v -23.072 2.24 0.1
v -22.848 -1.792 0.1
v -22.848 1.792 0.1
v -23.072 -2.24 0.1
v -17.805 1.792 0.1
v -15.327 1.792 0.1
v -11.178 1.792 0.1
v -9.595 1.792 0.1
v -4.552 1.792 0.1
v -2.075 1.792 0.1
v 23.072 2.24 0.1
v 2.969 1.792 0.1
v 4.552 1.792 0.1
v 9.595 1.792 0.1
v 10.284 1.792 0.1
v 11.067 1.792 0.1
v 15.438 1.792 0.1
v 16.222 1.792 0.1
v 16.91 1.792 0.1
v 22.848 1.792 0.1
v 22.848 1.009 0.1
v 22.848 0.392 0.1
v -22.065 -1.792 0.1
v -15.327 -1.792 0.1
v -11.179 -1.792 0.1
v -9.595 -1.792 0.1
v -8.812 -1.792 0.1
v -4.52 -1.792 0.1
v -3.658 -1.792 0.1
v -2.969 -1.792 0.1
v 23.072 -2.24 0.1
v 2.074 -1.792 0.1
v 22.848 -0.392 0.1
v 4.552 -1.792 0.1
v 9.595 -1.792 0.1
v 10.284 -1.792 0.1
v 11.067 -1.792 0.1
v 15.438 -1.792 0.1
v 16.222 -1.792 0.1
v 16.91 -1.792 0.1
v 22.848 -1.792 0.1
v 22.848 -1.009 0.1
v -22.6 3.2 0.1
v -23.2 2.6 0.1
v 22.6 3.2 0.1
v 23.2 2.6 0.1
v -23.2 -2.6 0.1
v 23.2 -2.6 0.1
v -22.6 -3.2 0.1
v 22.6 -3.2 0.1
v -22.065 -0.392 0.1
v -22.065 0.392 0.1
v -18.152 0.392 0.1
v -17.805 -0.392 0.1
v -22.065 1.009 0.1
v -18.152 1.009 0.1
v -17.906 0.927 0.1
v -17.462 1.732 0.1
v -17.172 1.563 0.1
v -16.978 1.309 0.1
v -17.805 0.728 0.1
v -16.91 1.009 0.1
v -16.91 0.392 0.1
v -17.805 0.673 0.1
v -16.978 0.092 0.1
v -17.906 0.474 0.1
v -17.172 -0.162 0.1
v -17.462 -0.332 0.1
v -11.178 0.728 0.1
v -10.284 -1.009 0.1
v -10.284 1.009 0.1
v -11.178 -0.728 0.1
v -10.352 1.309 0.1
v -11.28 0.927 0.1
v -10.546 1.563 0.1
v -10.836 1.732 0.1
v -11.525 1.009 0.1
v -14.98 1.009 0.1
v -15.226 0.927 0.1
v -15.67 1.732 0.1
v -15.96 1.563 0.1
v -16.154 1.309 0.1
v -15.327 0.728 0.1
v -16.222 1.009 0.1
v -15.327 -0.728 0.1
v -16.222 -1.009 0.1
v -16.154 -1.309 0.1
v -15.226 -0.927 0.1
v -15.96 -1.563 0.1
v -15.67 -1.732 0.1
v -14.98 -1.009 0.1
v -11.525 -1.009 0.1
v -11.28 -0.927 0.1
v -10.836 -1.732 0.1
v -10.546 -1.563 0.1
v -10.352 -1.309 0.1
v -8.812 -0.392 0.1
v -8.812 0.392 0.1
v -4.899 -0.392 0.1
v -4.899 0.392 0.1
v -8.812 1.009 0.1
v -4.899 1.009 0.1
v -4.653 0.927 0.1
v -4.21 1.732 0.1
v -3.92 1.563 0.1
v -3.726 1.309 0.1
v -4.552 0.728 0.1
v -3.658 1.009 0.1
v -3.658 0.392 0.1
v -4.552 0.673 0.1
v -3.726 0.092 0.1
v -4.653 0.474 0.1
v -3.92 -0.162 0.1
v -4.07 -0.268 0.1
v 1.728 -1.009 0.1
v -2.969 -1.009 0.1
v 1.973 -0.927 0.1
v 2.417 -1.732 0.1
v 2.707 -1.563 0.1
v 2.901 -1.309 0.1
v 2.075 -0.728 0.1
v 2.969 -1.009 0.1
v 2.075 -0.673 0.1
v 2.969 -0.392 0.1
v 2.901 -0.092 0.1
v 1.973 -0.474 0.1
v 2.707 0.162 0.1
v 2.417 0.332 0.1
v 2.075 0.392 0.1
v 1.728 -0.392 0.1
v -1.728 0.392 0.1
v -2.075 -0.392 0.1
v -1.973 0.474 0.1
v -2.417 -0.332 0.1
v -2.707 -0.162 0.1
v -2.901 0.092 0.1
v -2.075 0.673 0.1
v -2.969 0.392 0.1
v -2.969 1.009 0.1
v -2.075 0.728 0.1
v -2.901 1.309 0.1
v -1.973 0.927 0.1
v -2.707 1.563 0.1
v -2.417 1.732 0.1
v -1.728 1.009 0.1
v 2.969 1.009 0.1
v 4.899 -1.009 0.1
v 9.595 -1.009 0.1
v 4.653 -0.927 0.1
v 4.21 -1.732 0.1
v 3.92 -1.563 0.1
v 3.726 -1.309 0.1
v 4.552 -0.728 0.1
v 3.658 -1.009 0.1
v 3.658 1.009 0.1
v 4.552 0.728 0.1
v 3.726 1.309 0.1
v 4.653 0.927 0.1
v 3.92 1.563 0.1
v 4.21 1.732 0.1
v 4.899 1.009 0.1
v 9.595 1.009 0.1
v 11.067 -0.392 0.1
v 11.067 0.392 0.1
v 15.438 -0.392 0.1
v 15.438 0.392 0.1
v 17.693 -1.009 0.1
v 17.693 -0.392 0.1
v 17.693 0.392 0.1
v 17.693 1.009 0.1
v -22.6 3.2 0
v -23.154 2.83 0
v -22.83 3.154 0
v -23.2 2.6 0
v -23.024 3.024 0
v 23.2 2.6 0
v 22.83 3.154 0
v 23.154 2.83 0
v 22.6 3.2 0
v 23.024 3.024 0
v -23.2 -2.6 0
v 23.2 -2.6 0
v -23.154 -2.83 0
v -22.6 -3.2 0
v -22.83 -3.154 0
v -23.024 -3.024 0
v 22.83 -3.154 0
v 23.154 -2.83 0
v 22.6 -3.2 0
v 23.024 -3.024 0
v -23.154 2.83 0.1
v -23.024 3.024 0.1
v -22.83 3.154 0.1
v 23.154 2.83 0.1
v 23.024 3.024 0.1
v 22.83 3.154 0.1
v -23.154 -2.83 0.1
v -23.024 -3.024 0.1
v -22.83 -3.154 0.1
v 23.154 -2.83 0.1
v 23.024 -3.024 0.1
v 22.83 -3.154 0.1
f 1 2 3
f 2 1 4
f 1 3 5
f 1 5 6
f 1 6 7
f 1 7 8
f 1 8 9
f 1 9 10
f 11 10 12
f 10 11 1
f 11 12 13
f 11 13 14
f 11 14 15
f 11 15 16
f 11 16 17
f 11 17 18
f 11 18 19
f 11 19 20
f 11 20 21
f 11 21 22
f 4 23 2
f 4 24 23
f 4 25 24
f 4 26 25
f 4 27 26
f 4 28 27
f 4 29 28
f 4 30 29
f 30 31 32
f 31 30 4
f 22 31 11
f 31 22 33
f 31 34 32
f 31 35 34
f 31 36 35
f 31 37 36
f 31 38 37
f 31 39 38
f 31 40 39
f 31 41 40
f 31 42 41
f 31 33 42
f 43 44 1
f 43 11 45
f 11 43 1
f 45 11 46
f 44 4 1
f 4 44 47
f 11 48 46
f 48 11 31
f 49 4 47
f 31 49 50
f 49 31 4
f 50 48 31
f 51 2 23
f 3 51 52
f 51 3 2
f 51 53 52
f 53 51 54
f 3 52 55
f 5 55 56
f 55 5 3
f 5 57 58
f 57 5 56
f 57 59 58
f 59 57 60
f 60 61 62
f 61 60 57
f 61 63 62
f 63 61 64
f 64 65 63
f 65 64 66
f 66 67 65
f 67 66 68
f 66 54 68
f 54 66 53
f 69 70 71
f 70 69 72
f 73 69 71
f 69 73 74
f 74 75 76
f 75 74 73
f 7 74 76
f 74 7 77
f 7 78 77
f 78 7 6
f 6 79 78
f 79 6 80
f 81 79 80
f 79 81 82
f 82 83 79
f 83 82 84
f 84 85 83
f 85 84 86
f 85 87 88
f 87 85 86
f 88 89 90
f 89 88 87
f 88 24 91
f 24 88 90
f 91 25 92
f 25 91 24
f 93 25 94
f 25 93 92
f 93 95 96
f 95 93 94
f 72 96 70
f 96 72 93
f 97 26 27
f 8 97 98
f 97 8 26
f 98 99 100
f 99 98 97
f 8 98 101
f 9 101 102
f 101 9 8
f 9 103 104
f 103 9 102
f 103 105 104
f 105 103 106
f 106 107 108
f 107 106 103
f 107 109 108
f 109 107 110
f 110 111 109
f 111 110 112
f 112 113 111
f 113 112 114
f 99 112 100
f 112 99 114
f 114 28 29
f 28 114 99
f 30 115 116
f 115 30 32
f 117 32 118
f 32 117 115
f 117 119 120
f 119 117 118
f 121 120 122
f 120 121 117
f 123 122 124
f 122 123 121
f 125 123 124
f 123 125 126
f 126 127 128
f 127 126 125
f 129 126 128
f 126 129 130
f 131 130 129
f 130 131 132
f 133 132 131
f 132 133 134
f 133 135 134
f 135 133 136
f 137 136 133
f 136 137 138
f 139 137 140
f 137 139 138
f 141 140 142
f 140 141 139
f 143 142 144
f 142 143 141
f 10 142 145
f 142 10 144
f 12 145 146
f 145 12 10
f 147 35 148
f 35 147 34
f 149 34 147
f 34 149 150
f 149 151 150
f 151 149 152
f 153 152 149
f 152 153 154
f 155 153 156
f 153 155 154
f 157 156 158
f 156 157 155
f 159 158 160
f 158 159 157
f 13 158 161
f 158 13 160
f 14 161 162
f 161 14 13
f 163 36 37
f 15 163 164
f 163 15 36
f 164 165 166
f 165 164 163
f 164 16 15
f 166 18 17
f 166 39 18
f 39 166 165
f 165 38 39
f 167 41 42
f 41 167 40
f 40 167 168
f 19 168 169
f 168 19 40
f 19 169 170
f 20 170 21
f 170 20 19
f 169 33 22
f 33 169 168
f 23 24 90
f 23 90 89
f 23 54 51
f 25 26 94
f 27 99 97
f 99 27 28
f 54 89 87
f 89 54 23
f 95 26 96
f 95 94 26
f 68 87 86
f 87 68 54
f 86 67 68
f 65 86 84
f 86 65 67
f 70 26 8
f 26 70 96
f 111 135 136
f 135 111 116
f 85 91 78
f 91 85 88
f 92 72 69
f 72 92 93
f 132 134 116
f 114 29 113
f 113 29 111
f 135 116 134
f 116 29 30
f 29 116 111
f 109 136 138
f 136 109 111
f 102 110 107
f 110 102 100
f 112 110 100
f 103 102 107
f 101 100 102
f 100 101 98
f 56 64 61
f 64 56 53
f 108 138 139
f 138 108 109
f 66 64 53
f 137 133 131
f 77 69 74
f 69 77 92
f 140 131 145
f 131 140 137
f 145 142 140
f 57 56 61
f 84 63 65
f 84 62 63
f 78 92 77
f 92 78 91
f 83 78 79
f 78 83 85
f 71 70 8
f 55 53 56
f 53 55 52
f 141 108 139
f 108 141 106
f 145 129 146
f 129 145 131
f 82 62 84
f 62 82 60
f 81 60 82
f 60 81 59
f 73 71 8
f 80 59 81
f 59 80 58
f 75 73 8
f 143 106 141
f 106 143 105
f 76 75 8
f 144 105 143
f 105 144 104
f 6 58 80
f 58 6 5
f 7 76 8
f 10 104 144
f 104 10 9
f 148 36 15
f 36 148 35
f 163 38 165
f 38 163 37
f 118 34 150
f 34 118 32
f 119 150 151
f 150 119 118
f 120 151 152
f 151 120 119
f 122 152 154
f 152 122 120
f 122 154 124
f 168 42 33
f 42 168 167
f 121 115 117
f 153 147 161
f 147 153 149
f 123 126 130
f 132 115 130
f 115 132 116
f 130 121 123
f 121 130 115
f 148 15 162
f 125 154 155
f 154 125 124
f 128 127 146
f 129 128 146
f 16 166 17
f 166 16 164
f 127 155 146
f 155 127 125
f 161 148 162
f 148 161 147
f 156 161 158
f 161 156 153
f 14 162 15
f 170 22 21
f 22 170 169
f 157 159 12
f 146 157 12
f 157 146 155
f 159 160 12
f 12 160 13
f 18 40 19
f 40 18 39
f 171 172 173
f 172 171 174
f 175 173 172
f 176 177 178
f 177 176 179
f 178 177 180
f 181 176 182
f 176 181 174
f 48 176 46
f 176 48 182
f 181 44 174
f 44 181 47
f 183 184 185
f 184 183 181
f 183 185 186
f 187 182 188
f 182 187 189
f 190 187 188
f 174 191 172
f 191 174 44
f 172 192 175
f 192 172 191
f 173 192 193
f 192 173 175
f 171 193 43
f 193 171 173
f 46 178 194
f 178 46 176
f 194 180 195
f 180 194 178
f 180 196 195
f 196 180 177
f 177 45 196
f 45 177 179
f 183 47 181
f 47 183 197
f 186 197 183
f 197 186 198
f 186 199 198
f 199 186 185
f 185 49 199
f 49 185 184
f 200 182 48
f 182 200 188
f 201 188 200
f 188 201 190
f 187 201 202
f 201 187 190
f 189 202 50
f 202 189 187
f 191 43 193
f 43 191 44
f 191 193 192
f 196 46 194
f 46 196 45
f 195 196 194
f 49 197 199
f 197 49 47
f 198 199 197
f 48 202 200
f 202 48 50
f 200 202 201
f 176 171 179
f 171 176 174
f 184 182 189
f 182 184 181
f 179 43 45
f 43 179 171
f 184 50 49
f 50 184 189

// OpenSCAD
// file: s/6148328ps02.scad
use <../../lib.scad>
function ldraw_lib__s__6148328ps02() = [
// 0 ~Sticker  0.8 x  5.8 with Red "PORSCHE" on Black Background - Complementary faces
// 0 Name: s\6148328ps02.dat
// 0 Author: Massimo Maso [Sirio]
// 0 !LDRAW_ORG Subpart UPDATE 2024-05
// 0 !LICENSE Licensed under CC BY 4.0 : see CAreadme.txt
// 
// 0 BFC CERTIFY CCW
  [0,"BFC","CERTIFY"],
  [0,"BFC","CCW"],
// 
// 0 !HISTORY 2024-06-30 [OrionP] Official Update 2024-05
// 
// 
// 0 // Faces
// 3 16 -56.5 0 8 -58 0 6.5 -57.68 0 5.6
  [3,16,-56.5,0,8,-58,0,6.5,-57.68,0,5.6],
// 4 16 -56.5 0 8 -57.68 0 5.6 57.68 0 5.6 56.5 0 8
  [4,16,-56.5,0,8,-57.68,0,5.6,57.68,0,5.6,56.5,0,8],
// 3 16 56.5 0 8 57.68 0 5.6 58 0 6.5
  [3,16,56.5,0,8,57.68,0,5.6,58,0,6.5],
// 4 16 -58 0 6.5 -58 0 -6.5 -57.68 0 -5.6 -57.68 0 5.6
  [4,16,-58,0,6.5,-58,0,-6.5,-57.68,0,-5.6,-57.68,0,5.6],
// 4 16 58 0 6.5 57.68 0 5.6 57.68 0 -5.6 58 0 -6.5
  [4,16,58,0,6.5,57.68,0,5.6,57.68,0,-5.6,58,0,-6.5],
// 3 16 -56.5 0 -8 -57.68 0 -5.6 -58 0 -6.5
  [3,16,-56.5,0,-8,-57.68,0,-5.6,-58,0,-6.5],
// 4 16 -56.5 0 -8 56.5 0 -8 57.68 0 -5.6 -57.68 0 -5.6
  [4,16,-56.5,0,-8,56.5,0,-8,57.68,0,-5.6,-57.68,0,-5.6],
// 3 16 56.5 0 -8 58 0 -6.5 57.68 0 -5.6
  [3,16,56.5,0,-8,58,0,-6.5,57.68,0,-5.6],
];
module ldraw_lib__s__6148328ps02(step=0, col=false, unit=2/5, alt=false, line=0.2, solid=!$preview)
    makepoly(ldraw_lib__s__6148328ps02(), step=step, col=col, unit=unit, alt=alt, line=line, solid=solid);
ldraw_lib__s__6148328ps02(line=0.2);
// file: s/6148328ps01.scad
use <../../lib.scad>
function ldraw_lib__s__6148328ps01() = [
// 0 ~Sticker  0.8 x  5.8 with Red "PORSCHE" on Black Background - Outerbox for Logo Unscaled
// 0 Name: s\6148328ps01.dat
// 0 Author: Massimo Maso [Sirio]
// 0 !LDRAW_ORG Subpart UPDATE 2024-08
// 0 !LICENSE Licensed under CC BY 4.0 : see CAreadme.txt
// 
// 0 BFC CERTIFY CCW
  [0,"BFC","CERTIFY"],
  [0,"BFC","CCW"],
// 
// 0 !HISTORY 2023-10-31 [OrionP] Official Update 2023-05
// 0 !HISTORY 2024-07-21 [Sirio] Modified for change of logo primitive
// 0 !HISTORY 2024-09-30 [OrionP] Official Update 2024-08
// 
// 0 // Outerbox
// 4 16 -51.5 0 5 -51.5 0 -5 -51 0 -4 -51 0 4
  [4,16,-51.5,0,5,-51.5,0,-5,-51,0,-4,-51,0,4],
// 3 16 -51.5 0 5 -51 0 4 -39.7424 0 4
  [3,16,-51.5,0,5,-51,0,4,-39.7424,0,4],
// 3 16 -51.5 0 5 -39.7424 0 4 -34.2129 0 4
  [3,16,-51.5,0,5,-39.7424,0,4,-34.2129,0,4],
// 3 16 -51.5 0 5 -34.2129 0 4 -24.9513 0 4
  [3,16,-51.5,0,5,-34.2129,0,4,-24.9513,0,4],
// 3 16 -51.5 0 5 -24.9513 0 4 -21.4179 0 4
  [3,16,-51.5,0,5,-24.9513,0,4,-21.4179,0,4],
// 3 16 -51.5 0 5 -21.4179 0 4 -10.1603 0 4
  [3,16,-51.5,0,5,-21.4179,0,4,-10.1603,0,4],
// 3 16 -51.5 0 5 -10.1603 0 4 -4.6308 0 4
  [3,16,-51.5,0,5,-10.1603,0,4,-4.6308,0,4],
// 4 16 -51.5 0 5 -4.6308 0 4 6.6268 0 4 51.5 0 5
  [4,16,-51.5,0,5,-4.6308,0,4,6.6268,0,4,51.5,0,5],
// 3 16 51.5 0 5 6.6268 0 4 10.1603 0 4
  [3,16,51.5,0,5,6.6268,0,4,10.1603,0,4],
// 3 16 51.5 0 5 10.1603 0 4 21.4179 0 4
  [3,16,51.5,0,5,10.1603,0,4,21.4179,0,4],
// 3 16 51.5 0 5 21.4179 0 4 22.9553 0 4
  [3,16,51.5,0,5,21.4179,0,4,22.9553,0,4],
// 3 16 51.5 0 5 22.9553 0 4 24.7033 0 4
  [3,16,51.5,0,5,22.9553,0,4,24.7033,0,4],
// 3 16 51.5 0 5 24.7033 0 4 34.4609 0 4
  [3,16,51.5,0,5,24.7033,0,4,34.4609,0,4],
// 3 16 51.5 0 5 34.4609 0 4 36.2089 0 4
  [3,16,51.5,0,5,34.4609,0,4,36.2089,0,4],
// 3 16 51.5 0 5 36.2089 0 4 37.7464 0 4
  [3,16,51.5,0,5,36.2089,0,4,37.7464,0,4],
// 3 16 51.5 0 5 37.7464 0 4 51 0 4
  [3,16,51.5,0,5,37.7464,0,4,51,0,4],
// 3 16 51.5 0 5 51 0 4 51 0 2.252
  [3,16,51.5,0,5,51,0,4,51,0,2.252],
// 3 16 51.5 0 5 51 0 2.252 51 0 .874
  [3,16,51.5,0,5,51,0,2.252,51,0,.874],
// 3 16 -51.5 0 -5 -49.252 0 -4 -51 0 -4
  [3,16,-51.5,0,-5,-49.252,0,-4,-51,0,-4],
// 3 16 -51.5 0 -5 -34.212 0 -4 -49.252 0 -4
  [3,16,-51.5,0,-5,-34.212,0,-4,-49.252,0,-4],
// 3 16 -51.5 0 -5 -24.9522 0 -4 -34.212 0 -4
  [3,16,-51.5,0,-5,-24.9522,0,-4,-34.212,0,-4],
// 3 16 -51.5 0 -5 -21.4179 0 -4 -24.9522 0 -4
  [3,16,-51.5,0,-5,-21.4179,0,-4,-24.9522,0,-4],
// 3 16 -51.5 0 -5 -19.6699 0 -4 -21.4179 0 -4
  [3,16,-51.5,0,-5,-19.6699,0,-4,-21.4179,0,-4],
// 3 16 -51.5 0 -5 -10.0889 0 -4 -19.6699 0 -4
  [3,16,-51.5,0,-5,-10.0889,0,-4,-19.6699,0,-4],
// 3 16 -51.5 0 -5 -8.1643 0 -4 -10.0889 0 -4
  [3,16,-51.5,0,-5,-8.1643,0,-4,-10.0889,0,-4],
// 3 16 -51.5 0 -5 -6.6268 0 -4 -8.1643 0 -4
  [3,16,-51.5,0,-5,-6.6268,0,-4,-8.1643,0,-4],
// 4 16 -51.5 0 -5 51.5 0 -5 4.6299 0 -4 -6.6268 0 -4
  [4,16,-51.5,0,-5,51.5,0,-5,4.6299,0,-4,-6.6268,0,-4],
// 4 16 51.5 0 5 51 0 .874 51 0 -.874 51.5 0 -5
  [4,16,51.5,0,5,51,0,.874,51,0,-.874,51.5,0,-5],
// 3 16 51.5 0 -5 10.1612 0 -4 4.6299 0 -4
  [3,16,51.5,0,-5,10.1612,0,-4,4.6299,0,-4],
// 3 16 51.5 0 -5 21.4179 0 -4 10.1612 0 -4
  [3,16,51.5,0,-5,21.4179,0,-4,10.1612,0,-4],
// 3 16 51.5 0 -5 22.9553 0 -4 21.4179 0 -4
  [3,16,51.5,0,-5,22.9553,0,-4,21.4179,0,-4],
// 3 16 51.5 0 -5 24.7033 0 -4 22.9553 0 -4
  [3,16,51.5,0,-5,24.7033,0,-4,22.9553,0,-4],
// 3 16 51.5 0 -5 34.4609 0 -4 24.7033 0 -4
  [3,16,51.5,0,-5,34.4609,0,-4,24.7033,0,-4],
// 3 16 51.5 0 -5 36.2089 0 -4 34.4609 0 -4
  [3,16,51.5,0,-5,36.2089,0,-4,34.4609,0,-4],
// 3 16 51.5 0 -5 37.7464 0 -4 36.2089 0 -4
  [3,16,51.5,0,-5,37.7464,0,-4,36.2089,0,-4],
// 3 16 51.5 0 -5 51 0 -4 37.7464 0 -4
  [3,16,51.5,0,-5,51,0,-4,37.7464,0,-4],
// 3 16 51.5 0 -5 51 0 -2.252 51 0 -4
  [3,16,51.5,0,-5,51,0,-2.252,51,0,-4],
// 3 16 51.5 0 -5 51 0 -.874 51 0 -2.252
  [3,16,51.5,0,-5,51,0,-.874,51,0,-2.252],
];
module ldraw_lib__s__6148328ps01(step=0, col=false, unit=2/5, alt=false, line=0.2, solid=!$preview)
    makepoly(ldraw_lib__s__6148328ps01(), step=step, col=col, unit=unit, alt=alt, line=line, solid=solid);
ldraw_lib__s__6148328ps01(line=0.2);
// file: ../p/box3u12.scad
use <../lib.scad>
function ldraw_lib__box3u12() = [
// 0 Box with 3 Parallel Faces without Any Edges
// 0 Name: box3u12.dat
// 0 Author: J.C. Tchang [tchang]
// 0 !LDRAW_ORG Primitive UPDATE 2014-02
// 0 !LICENSE Licensed under CC BY 4.0 : see CAreadme.txt
// 
// 0 BFC CERTIFY CCW
  [0,"BFC","CERTIFY"],
  [0,"BFC","CCW"],
// 
// 0 !HISTORY 2014-12-23 [PTadmin] Official Update 2014-02
// 
// 
// 4 16 -1 1 1 1 1 1 1 1 -1 -1 1 -1
  [4,16,-1,1,1,1,1,1,1,1,-1,-1,1,-1],
// 4 16 -1 1 1 -1 0 1 1 0 1 1 1 1
  [4,16,-1,1,1,-1,0,1,1,0,1,1,1,1],
// 4 16 1 1 -1 1 0 -1 -1 0 -1 -1 1 -1
  [4,16,1,1,-1,1,0,-1,-1,0,-1,-1,1,-1],
];
module ldraw_lib__box3u12(step=0, col=false, unit=2/5, alt=false, line=0.2, solid=!$preview)
    makepoly(ldraw_lib__box3u12(), step=step, col=col, unit=unit, alt=alt, line=line, solid=solid);
ldraw_lib__box3u12(line=0.2);
// file: ../p/1-4cyli.scad
use <../lib.scad>
function ldraw_lib__1_4cyli() = [
// 0 Cylinder 0.25
// 0 Name: 1-4cyli.dat
// 0 Author: James Jessiman
// 0 !LDRAW_ORG Primitive UPDATE 2012-01
// 0 !LICENSE Licensed under CC BY 4.0 : see CAreadme.txt
// 
// 0 BFC CERTIFY CCW
  [0,"BFC","CERTIFY"],
  [0,"BFC","CCW"],
// 
// 0 !HISTORY 2002-03-23 [sbliss] Added BFC statement.
// 0 !HISTORY 2002-04-25 [PTadmin] Official Update 2002-02
// 0 !HISTORY 2007-06-22 [PTadmin] Header formatted for Contributor Agreement
// 0 !HISTORY 2008-07-01 [PTadmin] Official Update 2008-01
// 0 !HISTORY 2012-02-16 [Philo] Changed to CCW
// 0 !HISTORY 2012-03-30 [PTadmin] Official Update 2012-01
// 
// 
// 4 16 1 1 0 0.9239 1 0.3827 0.9239 0 0.3827 1 0 0
  [4,16,1,1,0,0.9239,1,0.3827,0.9239,0,0.3827,1,0,0],
// 5 24 1 0 0 1 1 0 0.9239 0 0.3827 1 0 -1
  [5,24,1,0,0,1,1,0,0.9239,0,0.3827,1,0,-1],
// 4 16 0.9239 1 0.3827 0.7071 1 0.7071 0.7071 0 0.7071 0.9239 0 0.3827
  [4,16,0.9239,1,0.3827,0.7071,1,0.7071,0.7071,0,0.7071,0.9239,0,0.3827],
// 5 24 0.9239 0 0.3827 0.9239 1 0.3827 0.7071 0 0.7071 1 0 0
  [5,24,0.9239,0,0.3827,0.9239,1,0.3827,0.7071,0,0.7071,1,0,0],
// 4 16 0.7071 1 0.7071 0.3827 1 0.9239 0.3827 0 0.9239 0.7071 0 0.7071
  [4,16,0.7071,1,0.7071,0.3827,1,0.9239,0.3827,0,0.9239,0.7071,0,0.7071],
// 5 24 0.7071 0 0.7071 0.7071 1 0.7071 0.3827 0 0.9239 0.9239 0 0.3827
  [5,24,0.7071,0,0.7071,0.7071,1,0.7071,0.3827,0,0.9239,0.9239,0,0.3827],
// 4 16 0.3827 1 0.9239 0 1 1 0 0 1 0.3827 0 0.9239
  [4,16,0.3827,1,0.9239,0,1,1,0,0,1,0.3827,0,0.9239],
// 5 24 0.3827 0 0.9239 0.3827 1 0.9239 0 0 1 0.7071 0 0.7071
  [5,24,0.3827,0,0.9239,0.3827,1,0.9239,0,0,1,0.7071,0,0.7071],
// 5 24 0 0 1 0 1 1 0.3827 0 0.9239 -1 0 1
  [5,24,0,0,1,0,1,1,0.3827,0,0.9239,-1,0,1],
];
module ldraw_lib__1_4cyli(step=0, col=false, unit=2/5, alt=false, line=0.2, solid=!$preview)
    makepoly(ldraw_lib__1_4cyli(), step=step, col=col, unit=unit, alt=alt, line=line, solid=solid);
ldraw_lib__1_4cyli(line=0.2);
// file: ../p/1-4chrd.scad
use <../lib.scad>
function ldraw_lib__1_4chrd() = [
// 0 Chord 0.25
// 0 Name: 1-4chrd.dat
// 0 Author: Max Martin Richter [MMR1988]
// 0 !LDRAW_ORG Primitive UPDATE 2023-05
// 0 !LICENSE Licensed under CC BY 4.0 : see CAreadme.txt
// 
// 0 BFC CERTIFY CCW
  [0,"BFC","CERTIFY"],
  [0,"BFC","CCW"],
// 
// 0 !HISTORY 2004-04-22 [PTadmin] Official Update 2004-02
// 0 !HISTORY 2007-10-09 [PTadmin] Header formatted for Contributor Agreement
// 0 !HISTORY 2008-07-01 [PTadmin] Official Update 2008-01
// 0 !HISTORY 2012-08-02 [MMR1988] Re-creation with PrimGen2 and Rectifier
// 0 !HISTORY 2012-08-09 [PTadmin] Official Update 2012-02
// 0 !HISTORY 2023-10-27 [OrionP] Change author to MMR1988 from hafhead
// 0 !HISTORY 2023-10-31 [OrionP] Official Update 2023-05
// 
// 4 16 0.9239 0 0.3827 0.3827 0 0.9239 0 0 1 1 0 0
  [4,16,0.9239,0,0.3827,0.3827,0,0.9239,0,0,1,1,0,0],
// 3 16 0.7071 0 0.7071 0.3827 0 0.9239 0.9239 0 0.3827
  [3,16,0.7071,0,0.7071,0.3827,0,0.9239,0.9239,0,0.3827],
];
module ldraw_lib__1_4chrd(step=0, col=false, unit=2/5, alt=false, line=0.2, solid=!$preview)
    makepoly(ldraw_lib__1_4chrd(), step=step, col=col, unit=unit, alt=alt, line=line, solid=solid);
ldraw_lib__1_4chrd(line=0.2);
// main file
use <../lib.scad>
use <../p/1-4chrd.scad>
use <../p/1-4cyli.scad>
use <../p/box3u12.scad>
use <../p/logo-porsche-box.scad>
use <../p/logo-porsche-text.scad>
use <s/6148328ps01.scad>
use <s/6148328ps02.scad>
function ldraw_lib__6148328p() = [
// 0 Sticker  0.8 x  5.8 with Red "PORSCHE" on White Background
// 0 Name: 6148328p.dat
// 0 Author: Massimo Maso [Sirio]
// 0 !LDRAW_ORG Part UPDATE 2024-08
// 0 !LICENSE Licensed under CC BY 4.0 : see CAreadme.txt
// 
// 0 BFC CERTIFY CCW
  [0,"BFC","CERTIFY"],
  [0,"BFC","CCW"],
// 
// 0 !KEYWORDS 917K, 919, Bricklink 75876stk01, Brickowl 852010, Hybrid, Pit Lane
// 0 !KEYWORDS Rebrickable 26357, set 75876, Speed Champions
// 
// 0 !HISTORY 2024-09-30 [OrionP] Official Update 2024-08
// 
// 0 // Subpart
// 1 15 0 -.25 0 1.12 0 0 0 1 0 0 0 1.12 s\6148328ps01.dat
  [1,15,0,-.25,0,1.12,0,0,0,1,0,0,0,1.12, ldraw_lib__s__6148328ps01()],
// 1 15 0 -.25 0 1 0 0 0 1 0 0 0 1 s\6148328ps02.dat
  [1,15,0,-.25,0,1,0,0,0,1,0,0,0,1, ldraw_lib__s__6148328ps02()],
// 0 // Logo primitives
// 1 4 0 -.25 0 1.12 0 0 0 1 0 0 0 1.12 logo-porsche-text.dat
  [1,4,0,-.25,0,1.12,0,0,0,1,0,0,0,1.12, ldraw_lib__logo_porsche_text()],
// 1 15 0 -.25 0 1.12 0 0 0 1 0 0 0 1.12 logo-porsche-box.dat
  [1,15,0,-.25,0,1.12,0,0,0,1,0,0,0,1.12, ldraw_lib__logo_porsche_box()],
// 0 // Primitives
// 1 16 -56.5 0 6.5 -1.5 0 0 0 -1 0 0 0 1.5 1-4chrd.dat
  [1,16,-56.5,0,6.5,-1.5,0,0,0,-1,0,0,0,1.5, ldraw_lib__1_4chrd()],
// 1 16 56.5 0 6.5 1.5 0 0 0 -1 0 0 0 1.5 1-4chrd.dat
  [1,16,56.5,0,6.5,1.5,0,0,0,-1,0,0,0,1.5, ldraw_lib__1_4chrd()],
// 1 16 0 -.25 0 0 0 58 0 .25 0 6.5 0 0 box3u12.dat
  [1,16,0,-.25,0,0,0,58,0,.25,0,6.5,0,0, ldraw_lib__box3u12()],
// 1 16 -56.5 0 -6.5 -1.5 0 0 0 -1 0 0 0 -1.5 1-4chrd.dat
  [1,16,-56.5,0,-6.5,-1.5,0,0,0,-1,0,0,0,-1.5, ldraw_lib__1_4chrd()],
// 1 16 56.5 0 -6.5 1.5 0 0 0 -1 0 0 0 -1.5 1-4chrd.dat
  [1,16,56.5,0,-6.5,1.5,0,0,0,-1,0,0,0,-1.5, ldraw_lib__1_4chrd()],
// 1 16 -56.5 0 6.5 -1.5 0 0 0 -.25 0 0 0 1.5 1-4cyli.dat
  [1,16,-56.5,0,6.5,-1.5,0,0,0,-.25,0,0,0,1.5, ldraw_lib__1_4cyli()],
// 1 16 56.5 0 6.5 1.5 0 0 0 -.25 0 0 0 1.5 1-4cyli.dat
  [1,16,56.5,0,6.5,1.5,0,0,0,-.25,0,0,0,1.5, ldraw_lib__1_4cyli()],
// 1 16 -56.5 0 -6.5 -1.5 0 0 0 -.25 0 0 0 -1.5 1-4cyli.dat
  [1,16,-56.5,0,-6.5,-1.5,0,0,0,-.25,0,0,0,-1.5, ldraw_lib__1_4cyli()],
// 1 16 56.5 0 -6.5 1.5 0 0 0 -.25 0 0 0 -1.5 1-4cyli.dat
  [1,16,56.5,0,-6.5,1.5,0,0,0,-.25,0,0,0,-1.5, ldraw_lib__1_4cyli()],
// 1 15 -56.5 -.25 6.5 -1.5 0 0 0 1 0 0 0 1.5 1-4chrd.dat
  [1,15,-56.5,-.25,6.5,-1.5,0,0,0,1,0,0,0,1.5, ldraw_lib__1_4chrd()],
// 1 15 56.5 -.25 6.5 1.5 0 0 0 1 0 0 0 1.5 1-4chrd.dat
  [1,15,56.5,-.25,6.5,1.5,0,0,0,1,0,0,0,1.5, ldraw_lib__1_4chrd()],
// 1 15 -56.5 -.25 -6.5 -1.5 0 0 0 1 0 0 0 -1.5 1-4chrd.dat
  [1,15,-56.5,-.25,-6.5,-1.5,0,0,0,1,0,0,0,-1.5, ldraw_lib__1_4chrd()],
// 1 15 56.5 -.25 -6.5 1.5 0 0 0 1 0 0 0 -1.5 1-4chrd.dat
  [1,15,56.5,-.25,-6.5,1.5,0,0,0,1,0,0,0,-1.5, ldraw_lib__1_4chrd()],
// 0 // Bottom faces
// 4 16 56.5 0 8 58 0 6.5 -58 0 6.5 -56.5 0 8
  [4,16,56.5,0,8,58,0,6.5,-58,0,6.5,-56.5,0,8],
// 4 16 56.5 0 -8 -56.5 0 -8 -58 0 -6.5 58 0 -6.5
  [4,16,56.5,0,-8,-56.5,0,-8,-58,0,-6.5,58,0,-6.5],
// 0 // Lateral faces
// 4 16 -56.5 0 8 -56.5 -.25 8 56.5 -.25 8 56.5 0 8
  [4,16,-56.5,0,8,-56.5,-.25,8,56.5,-.25,8,56.5,0,8],
// 4 16 -56.5 0 -8 56.5 0 -8 56.5 -.25 -8 -56.5 -.25 -8
  [4,16,-56.5,0,-8,56.5,0,-8,56.5,-.25,-8,-56.5,-.25,-8],
];
module ldraw_lib__6148328p(step=0, col=false, unit=2/5, alt=false, line=0.2, solid=!$preview)
    makepoly(ldraw_lib__6148328p(), step=step, col=col, unit=unit, alt=alt, line=line, solid=solid);
ldraw_lib__6148328p(line=0.2);
